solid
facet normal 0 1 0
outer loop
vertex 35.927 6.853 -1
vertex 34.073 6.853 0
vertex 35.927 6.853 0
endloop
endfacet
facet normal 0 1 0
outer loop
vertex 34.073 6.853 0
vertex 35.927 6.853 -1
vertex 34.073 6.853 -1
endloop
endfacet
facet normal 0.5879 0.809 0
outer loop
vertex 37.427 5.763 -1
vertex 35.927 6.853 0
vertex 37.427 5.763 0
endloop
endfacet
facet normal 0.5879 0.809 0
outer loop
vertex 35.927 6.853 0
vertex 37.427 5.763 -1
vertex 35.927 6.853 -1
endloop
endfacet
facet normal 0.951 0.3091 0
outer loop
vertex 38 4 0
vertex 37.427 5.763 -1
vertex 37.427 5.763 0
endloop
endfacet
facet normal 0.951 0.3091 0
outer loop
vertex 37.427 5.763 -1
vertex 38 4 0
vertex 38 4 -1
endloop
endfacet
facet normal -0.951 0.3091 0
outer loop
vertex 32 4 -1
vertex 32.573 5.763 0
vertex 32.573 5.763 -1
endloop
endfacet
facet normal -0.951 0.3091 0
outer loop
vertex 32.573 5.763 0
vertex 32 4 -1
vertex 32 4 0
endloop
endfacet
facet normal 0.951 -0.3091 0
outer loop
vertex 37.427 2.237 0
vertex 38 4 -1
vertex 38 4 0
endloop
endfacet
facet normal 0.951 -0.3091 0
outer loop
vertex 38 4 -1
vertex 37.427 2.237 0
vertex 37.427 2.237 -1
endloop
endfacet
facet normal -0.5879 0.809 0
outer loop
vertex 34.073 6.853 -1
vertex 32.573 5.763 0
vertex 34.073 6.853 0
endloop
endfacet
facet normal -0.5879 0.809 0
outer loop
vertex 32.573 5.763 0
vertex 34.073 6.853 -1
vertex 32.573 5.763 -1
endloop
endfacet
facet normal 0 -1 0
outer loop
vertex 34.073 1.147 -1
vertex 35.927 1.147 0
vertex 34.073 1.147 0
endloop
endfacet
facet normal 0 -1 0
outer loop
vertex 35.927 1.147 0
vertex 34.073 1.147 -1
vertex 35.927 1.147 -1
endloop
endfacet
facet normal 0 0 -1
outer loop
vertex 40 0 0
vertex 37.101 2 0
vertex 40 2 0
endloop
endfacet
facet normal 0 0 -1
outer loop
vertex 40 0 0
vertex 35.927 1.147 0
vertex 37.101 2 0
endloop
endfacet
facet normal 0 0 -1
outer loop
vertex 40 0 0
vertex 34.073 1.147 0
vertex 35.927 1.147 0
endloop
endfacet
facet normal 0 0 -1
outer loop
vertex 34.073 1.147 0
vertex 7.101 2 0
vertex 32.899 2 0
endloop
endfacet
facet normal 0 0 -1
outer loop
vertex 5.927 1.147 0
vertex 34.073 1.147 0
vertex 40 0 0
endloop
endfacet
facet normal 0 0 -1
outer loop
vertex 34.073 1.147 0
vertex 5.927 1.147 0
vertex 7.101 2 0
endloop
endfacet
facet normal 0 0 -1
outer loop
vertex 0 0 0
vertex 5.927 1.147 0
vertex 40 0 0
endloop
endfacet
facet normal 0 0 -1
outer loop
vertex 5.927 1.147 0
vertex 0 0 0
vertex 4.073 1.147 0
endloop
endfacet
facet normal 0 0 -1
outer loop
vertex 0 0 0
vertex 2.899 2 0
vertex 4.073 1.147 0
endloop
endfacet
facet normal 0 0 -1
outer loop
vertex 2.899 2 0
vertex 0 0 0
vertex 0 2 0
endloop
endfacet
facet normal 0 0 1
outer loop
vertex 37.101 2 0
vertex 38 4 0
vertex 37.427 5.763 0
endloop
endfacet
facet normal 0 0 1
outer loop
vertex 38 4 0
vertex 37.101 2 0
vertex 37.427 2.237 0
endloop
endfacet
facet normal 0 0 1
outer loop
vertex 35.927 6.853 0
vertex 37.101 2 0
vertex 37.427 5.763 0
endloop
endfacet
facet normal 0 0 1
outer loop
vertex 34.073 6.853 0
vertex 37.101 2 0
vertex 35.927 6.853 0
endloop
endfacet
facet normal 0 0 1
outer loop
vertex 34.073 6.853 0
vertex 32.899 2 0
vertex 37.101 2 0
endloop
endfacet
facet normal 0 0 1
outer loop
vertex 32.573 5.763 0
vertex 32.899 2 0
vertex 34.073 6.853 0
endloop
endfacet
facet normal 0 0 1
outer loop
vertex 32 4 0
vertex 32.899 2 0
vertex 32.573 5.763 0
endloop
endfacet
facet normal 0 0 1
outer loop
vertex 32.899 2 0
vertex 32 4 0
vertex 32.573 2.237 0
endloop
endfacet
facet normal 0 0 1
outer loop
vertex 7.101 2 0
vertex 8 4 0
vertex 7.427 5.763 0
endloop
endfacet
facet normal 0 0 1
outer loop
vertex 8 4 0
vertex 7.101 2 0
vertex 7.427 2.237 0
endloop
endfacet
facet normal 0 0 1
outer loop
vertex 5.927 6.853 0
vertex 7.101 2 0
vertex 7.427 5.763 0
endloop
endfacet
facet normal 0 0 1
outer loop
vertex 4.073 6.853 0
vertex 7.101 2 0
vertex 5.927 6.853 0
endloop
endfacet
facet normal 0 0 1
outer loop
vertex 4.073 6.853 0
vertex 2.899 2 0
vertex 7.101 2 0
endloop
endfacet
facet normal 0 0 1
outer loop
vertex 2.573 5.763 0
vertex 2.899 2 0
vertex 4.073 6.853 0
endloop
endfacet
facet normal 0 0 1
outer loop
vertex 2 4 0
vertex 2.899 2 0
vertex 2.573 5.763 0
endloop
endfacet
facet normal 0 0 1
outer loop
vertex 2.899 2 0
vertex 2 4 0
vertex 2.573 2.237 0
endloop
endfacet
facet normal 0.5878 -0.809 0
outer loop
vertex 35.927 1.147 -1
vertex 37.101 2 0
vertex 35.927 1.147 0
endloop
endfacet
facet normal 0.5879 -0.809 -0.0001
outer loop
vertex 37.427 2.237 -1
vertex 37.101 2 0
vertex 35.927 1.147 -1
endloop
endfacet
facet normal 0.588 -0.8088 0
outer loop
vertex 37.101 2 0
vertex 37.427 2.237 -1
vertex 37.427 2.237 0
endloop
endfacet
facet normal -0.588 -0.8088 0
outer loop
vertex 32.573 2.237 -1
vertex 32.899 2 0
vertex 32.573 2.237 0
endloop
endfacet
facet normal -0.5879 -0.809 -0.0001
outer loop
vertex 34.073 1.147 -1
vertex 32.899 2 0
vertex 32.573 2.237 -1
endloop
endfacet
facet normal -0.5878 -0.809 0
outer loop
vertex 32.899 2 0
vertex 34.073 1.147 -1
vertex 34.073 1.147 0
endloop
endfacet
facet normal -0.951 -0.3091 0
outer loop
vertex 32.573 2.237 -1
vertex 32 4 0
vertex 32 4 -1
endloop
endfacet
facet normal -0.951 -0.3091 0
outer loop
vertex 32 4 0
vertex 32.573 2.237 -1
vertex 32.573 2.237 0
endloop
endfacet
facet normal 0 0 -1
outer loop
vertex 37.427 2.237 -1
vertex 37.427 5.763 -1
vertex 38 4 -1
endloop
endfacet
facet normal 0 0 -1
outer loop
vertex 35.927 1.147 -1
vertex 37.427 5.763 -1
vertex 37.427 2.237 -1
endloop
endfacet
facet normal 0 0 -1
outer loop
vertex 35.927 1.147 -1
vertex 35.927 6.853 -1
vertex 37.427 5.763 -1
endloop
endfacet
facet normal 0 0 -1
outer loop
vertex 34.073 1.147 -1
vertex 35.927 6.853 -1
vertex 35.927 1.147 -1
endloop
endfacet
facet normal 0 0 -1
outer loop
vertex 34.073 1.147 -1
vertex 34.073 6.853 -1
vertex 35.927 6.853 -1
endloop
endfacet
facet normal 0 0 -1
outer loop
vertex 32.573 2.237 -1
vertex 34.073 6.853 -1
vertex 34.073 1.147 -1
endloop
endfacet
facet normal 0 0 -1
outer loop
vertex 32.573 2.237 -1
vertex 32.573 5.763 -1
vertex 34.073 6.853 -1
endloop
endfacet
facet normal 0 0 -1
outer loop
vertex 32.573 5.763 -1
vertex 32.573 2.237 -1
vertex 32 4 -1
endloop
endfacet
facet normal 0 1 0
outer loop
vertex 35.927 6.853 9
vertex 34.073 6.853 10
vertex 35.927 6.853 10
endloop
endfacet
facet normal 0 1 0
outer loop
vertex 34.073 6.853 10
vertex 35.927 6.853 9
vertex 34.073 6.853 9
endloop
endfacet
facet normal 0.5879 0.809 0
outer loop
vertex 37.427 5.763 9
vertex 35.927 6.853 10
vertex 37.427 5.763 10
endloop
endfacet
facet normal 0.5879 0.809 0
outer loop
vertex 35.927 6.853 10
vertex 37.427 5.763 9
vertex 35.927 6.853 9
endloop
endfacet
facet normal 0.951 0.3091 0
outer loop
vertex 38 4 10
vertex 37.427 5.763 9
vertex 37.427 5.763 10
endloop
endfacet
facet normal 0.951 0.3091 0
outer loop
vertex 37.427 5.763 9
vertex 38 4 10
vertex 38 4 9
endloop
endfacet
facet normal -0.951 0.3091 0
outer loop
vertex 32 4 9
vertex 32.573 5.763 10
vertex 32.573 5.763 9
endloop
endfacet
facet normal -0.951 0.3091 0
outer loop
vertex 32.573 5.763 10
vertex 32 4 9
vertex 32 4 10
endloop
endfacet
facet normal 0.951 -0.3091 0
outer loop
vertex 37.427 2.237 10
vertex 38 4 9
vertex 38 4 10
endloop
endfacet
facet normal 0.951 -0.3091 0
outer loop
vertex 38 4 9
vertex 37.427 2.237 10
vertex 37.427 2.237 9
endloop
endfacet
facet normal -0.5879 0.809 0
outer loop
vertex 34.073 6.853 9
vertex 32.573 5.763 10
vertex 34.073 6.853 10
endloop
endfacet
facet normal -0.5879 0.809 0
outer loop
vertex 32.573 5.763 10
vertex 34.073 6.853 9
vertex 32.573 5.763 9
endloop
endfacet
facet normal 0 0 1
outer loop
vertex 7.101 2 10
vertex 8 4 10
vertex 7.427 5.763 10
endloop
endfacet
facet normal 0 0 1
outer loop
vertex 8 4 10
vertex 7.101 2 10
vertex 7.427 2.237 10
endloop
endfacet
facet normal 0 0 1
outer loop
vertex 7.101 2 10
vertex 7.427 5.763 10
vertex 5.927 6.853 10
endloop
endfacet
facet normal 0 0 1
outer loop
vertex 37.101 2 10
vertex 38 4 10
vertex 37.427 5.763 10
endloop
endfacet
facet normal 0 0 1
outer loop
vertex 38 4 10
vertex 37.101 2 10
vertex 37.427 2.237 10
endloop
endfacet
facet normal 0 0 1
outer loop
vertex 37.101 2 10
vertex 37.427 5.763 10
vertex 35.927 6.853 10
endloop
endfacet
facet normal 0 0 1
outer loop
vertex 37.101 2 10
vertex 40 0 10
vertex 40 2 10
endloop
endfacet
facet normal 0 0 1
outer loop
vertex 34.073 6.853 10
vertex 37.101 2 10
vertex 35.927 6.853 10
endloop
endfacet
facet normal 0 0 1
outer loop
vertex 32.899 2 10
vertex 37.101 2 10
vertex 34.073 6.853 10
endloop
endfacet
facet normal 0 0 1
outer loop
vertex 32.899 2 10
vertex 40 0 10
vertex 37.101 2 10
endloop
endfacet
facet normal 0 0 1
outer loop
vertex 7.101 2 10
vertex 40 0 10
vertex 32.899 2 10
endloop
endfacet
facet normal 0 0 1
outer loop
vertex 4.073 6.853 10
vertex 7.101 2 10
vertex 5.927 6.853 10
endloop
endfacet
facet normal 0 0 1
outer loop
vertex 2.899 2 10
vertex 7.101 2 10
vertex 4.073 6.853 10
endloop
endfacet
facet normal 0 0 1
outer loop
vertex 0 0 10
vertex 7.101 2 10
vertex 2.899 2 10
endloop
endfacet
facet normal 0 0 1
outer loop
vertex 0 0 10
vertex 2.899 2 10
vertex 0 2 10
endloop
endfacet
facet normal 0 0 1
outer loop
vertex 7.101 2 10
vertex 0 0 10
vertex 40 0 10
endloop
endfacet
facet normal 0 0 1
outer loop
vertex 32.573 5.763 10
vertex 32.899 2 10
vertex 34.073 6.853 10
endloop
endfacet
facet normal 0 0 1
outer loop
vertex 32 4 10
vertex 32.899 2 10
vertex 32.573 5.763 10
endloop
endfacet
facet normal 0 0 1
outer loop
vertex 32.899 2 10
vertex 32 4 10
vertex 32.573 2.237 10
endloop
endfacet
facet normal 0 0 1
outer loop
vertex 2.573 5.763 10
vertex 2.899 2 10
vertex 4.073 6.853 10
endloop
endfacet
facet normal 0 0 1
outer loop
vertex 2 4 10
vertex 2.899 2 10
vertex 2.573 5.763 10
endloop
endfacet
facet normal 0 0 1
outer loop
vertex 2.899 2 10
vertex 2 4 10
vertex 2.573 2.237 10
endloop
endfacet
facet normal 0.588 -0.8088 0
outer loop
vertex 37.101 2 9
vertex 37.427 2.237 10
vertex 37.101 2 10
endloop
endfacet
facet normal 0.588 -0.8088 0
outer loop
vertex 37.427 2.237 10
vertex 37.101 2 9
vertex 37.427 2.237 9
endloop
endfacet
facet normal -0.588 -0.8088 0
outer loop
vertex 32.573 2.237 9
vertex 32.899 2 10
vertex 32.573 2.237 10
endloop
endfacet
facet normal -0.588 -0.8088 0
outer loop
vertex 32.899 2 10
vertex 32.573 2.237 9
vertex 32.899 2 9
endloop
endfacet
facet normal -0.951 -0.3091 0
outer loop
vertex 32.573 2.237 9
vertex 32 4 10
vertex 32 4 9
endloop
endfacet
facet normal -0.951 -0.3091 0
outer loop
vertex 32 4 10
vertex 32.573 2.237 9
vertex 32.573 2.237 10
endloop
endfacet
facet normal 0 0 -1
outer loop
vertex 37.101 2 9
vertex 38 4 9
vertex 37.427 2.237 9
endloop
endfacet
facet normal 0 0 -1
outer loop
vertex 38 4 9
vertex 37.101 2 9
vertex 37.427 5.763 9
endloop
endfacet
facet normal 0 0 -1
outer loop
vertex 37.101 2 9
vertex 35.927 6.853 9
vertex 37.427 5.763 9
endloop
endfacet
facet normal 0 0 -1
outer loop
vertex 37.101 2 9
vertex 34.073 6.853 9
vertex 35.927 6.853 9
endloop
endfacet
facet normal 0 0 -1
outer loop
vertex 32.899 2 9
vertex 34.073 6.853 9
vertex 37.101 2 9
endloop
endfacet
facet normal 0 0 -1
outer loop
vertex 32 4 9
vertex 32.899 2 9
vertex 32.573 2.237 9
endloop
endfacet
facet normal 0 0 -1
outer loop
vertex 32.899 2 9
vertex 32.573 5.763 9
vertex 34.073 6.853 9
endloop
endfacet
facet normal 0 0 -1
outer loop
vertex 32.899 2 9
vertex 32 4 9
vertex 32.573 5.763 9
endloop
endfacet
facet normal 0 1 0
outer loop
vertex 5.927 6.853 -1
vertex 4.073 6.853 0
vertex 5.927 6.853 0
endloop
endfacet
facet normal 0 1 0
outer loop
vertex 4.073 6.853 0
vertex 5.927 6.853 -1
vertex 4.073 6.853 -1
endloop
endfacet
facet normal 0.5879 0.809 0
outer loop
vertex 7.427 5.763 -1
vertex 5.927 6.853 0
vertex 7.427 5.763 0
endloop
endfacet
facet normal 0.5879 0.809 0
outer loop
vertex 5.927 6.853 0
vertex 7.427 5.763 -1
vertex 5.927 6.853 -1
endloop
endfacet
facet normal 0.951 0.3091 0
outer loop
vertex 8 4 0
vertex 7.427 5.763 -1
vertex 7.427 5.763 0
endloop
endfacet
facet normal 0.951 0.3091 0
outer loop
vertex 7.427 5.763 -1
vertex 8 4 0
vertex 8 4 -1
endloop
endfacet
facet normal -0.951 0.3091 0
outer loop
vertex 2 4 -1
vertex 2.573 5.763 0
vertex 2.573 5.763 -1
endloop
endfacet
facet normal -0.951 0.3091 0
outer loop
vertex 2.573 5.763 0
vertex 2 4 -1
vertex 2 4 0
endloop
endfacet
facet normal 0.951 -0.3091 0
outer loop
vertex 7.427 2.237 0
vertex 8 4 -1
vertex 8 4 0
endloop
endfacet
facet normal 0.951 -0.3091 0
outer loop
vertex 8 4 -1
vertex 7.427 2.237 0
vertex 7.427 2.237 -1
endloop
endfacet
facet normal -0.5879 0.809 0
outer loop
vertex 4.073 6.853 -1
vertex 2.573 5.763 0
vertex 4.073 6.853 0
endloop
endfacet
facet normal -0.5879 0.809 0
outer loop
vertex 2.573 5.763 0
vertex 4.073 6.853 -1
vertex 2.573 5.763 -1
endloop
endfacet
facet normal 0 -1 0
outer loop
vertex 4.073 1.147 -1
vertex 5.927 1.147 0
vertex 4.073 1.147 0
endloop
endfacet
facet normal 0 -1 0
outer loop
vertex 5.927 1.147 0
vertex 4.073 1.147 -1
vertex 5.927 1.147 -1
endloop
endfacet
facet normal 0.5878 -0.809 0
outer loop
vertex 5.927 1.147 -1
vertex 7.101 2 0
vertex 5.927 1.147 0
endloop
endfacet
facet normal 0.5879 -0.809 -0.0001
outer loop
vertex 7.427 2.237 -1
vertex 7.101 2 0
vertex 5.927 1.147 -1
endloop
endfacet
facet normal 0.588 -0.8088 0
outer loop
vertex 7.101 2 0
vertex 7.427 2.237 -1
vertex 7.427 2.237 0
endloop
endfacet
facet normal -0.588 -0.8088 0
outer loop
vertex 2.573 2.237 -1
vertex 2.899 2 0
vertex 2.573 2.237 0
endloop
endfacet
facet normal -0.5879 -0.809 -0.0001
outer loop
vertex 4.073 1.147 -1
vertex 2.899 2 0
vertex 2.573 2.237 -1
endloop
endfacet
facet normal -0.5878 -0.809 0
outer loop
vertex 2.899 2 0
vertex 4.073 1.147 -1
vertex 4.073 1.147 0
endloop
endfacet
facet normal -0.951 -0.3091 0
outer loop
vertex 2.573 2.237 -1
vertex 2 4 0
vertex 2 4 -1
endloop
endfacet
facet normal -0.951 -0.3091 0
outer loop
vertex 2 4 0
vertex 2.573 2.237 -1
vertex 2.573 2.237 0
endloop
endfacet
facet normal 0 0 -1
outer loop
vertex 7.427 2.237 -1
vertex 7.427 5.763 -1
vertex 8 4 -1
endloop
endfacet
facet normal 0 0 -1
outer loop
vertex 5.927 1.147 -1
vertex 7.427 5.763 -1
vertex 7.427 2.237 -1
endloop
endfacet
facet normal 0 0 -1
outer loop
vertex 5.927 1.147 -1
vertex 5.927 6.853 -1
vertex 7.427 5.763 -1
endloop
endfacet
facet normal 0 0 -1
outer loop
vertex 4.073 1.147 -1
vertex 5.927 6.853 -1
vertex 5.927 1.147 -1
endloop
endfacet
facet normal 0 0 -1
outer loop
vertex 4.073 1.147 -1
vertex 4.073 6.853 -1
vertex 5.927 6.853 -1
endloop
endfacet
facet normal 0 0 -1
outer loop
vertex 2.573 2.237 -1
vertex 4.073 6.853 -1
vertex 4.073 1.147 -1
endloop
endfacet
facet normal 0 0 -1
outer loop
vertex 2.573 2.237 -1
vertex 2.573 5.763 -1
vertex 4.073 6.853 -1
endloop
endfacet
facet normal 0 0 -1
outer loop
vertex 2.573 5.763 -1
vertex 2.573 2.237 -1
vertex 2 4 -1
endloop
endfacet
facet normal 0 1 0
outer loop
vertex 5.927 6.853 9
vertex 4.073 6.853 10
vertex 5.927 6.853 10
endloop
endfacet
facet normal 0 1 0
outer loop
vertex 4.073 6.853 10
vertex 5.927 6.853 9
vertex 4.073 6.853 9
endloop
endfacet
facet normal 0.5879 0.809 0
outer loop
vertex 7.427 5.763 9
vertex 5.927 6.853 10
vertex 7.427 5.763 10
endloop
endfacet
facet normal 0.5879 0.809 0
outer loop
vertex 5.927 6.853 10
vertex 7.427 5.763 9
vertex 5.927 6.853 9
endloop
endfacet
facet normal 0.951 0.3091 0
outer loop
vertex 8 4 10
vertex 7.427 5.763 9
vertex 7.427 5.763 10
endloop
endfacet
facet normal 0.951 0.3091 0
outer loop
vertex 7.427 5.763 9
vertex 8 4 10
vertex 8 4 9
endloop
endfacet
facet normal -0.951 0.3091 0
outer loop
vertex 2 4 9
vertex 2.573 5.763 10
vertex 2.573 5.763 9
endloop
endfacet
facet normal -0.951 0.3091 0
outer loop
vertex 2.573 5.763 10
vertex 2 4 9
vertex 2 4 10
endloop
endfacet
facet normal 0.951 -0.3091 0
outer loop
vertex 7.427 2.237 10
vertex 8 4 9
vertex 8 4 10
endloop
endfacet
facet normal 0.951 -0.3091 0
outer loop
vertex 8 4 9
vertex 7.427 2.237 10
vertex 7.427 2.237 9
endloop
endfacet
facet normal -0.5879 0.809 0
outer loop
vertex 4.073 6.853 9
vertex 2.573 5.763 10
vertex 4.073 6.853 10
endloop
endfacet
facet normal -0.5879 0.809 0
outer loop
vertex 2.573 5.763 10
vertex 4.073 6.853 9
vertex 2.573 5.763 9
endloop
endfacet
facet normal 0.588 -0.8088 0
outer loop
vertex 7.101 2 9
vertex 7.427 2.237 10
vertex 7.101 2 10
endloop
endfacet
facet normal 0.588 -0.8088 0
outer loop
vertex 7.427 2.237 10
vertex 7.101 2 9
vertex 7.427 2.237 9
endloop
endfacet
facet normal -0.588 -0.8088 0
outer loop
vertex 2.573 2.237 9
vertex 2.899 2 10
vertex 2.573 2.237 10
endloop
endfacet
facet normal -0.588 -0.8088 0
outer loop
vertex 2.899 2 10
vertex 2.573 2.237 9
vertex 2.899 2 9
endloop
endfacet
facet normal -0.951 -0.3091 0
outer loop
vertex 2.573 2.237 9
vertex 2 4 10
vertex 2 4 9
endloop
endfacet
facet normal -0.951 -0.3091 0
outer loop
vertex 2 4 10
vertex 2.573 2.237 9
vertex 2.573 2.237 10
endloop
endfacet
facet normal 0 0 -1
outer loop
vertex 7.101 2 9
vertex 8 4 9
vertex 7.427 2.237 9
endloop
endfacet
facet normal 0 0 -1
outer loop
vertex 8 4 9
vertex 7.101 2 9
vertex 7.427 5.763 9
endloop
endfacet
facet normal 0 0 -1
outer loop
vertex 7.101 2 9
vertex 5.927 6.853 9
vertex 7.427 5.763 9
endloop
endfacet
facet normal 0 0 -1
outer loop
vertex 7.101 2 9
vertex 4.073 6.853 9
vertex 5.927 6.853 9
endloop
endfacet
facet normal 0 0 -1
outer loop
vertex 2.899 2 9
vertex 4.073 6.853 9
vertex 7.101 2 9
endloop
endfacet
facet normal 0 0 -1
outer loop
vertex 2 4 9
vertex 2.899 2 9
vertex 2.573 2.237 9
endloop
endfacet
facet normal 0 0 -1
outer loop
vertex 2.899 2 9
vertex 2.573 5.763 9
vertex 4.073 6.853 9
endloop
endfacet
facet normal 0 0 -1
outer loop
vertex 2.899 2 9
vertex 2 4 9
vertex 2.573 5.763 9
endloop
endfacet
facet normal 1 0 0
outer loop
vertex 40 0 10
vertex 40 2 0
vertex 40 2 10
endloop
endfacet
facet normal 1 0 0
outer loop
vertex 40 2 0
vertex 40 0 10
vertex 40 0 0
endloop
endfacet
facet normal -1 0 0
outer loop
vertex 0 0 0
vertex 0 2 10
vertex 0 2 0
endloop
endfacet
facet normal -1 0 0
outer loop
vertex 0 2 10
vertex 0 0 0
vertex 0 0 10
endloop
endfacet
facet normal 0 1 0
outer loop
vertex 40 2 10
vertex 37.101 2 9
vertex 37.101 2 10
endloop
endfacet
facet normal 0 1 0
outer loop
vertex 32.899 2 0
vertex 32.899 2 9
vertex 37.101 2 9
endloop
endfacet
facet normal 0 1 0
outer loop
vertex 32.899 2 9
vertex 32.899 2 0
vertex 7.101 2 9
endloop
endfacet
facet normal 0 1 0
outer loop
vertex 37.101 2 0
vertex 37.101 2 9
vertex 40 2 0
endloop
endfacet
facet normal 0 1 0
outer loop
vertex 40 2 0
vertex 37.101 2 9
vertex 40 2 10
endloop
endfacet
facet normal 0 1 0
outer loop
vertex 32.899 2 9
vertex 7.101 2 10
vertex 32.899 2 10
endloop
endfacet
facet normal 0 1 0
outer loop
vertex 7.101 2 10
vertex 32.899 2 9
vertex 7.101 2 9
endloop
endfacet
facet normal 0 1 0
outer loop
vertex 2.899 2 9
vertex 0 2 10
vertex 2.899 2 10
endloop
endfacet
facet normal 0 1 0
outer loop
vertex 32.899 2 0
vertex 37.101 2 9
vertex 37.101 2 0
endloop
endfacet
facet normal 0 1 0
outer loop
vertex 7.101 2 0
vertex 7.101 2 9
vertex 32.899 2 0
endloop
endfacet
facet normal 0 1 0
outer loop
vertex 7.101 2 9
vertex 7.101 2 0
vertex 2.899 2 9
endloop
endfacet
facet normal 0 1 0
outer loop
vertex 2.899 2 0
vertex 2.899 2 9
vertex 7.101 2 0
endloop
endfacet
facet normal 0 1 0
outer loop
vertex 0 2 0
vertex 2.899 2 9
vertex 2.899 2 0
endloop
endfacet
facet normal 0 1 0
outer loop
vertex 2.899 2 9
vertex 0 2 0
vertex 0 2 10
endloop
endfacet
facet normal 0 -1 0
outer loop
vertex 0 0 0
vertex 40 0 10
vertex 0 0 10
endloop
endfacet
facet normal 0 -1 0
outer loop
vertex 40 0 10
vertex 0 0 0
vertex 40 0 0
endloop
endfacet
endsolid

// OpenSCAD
cube([40,2,10]);

for( i =[
  [35,4,0],
  [35,4,10],
  [5,4,0],
  [5,4,10] ])
{
  translate(i)
  rotate(a=[0,180,0])
  cylinder(h = 1, r=3);
}
